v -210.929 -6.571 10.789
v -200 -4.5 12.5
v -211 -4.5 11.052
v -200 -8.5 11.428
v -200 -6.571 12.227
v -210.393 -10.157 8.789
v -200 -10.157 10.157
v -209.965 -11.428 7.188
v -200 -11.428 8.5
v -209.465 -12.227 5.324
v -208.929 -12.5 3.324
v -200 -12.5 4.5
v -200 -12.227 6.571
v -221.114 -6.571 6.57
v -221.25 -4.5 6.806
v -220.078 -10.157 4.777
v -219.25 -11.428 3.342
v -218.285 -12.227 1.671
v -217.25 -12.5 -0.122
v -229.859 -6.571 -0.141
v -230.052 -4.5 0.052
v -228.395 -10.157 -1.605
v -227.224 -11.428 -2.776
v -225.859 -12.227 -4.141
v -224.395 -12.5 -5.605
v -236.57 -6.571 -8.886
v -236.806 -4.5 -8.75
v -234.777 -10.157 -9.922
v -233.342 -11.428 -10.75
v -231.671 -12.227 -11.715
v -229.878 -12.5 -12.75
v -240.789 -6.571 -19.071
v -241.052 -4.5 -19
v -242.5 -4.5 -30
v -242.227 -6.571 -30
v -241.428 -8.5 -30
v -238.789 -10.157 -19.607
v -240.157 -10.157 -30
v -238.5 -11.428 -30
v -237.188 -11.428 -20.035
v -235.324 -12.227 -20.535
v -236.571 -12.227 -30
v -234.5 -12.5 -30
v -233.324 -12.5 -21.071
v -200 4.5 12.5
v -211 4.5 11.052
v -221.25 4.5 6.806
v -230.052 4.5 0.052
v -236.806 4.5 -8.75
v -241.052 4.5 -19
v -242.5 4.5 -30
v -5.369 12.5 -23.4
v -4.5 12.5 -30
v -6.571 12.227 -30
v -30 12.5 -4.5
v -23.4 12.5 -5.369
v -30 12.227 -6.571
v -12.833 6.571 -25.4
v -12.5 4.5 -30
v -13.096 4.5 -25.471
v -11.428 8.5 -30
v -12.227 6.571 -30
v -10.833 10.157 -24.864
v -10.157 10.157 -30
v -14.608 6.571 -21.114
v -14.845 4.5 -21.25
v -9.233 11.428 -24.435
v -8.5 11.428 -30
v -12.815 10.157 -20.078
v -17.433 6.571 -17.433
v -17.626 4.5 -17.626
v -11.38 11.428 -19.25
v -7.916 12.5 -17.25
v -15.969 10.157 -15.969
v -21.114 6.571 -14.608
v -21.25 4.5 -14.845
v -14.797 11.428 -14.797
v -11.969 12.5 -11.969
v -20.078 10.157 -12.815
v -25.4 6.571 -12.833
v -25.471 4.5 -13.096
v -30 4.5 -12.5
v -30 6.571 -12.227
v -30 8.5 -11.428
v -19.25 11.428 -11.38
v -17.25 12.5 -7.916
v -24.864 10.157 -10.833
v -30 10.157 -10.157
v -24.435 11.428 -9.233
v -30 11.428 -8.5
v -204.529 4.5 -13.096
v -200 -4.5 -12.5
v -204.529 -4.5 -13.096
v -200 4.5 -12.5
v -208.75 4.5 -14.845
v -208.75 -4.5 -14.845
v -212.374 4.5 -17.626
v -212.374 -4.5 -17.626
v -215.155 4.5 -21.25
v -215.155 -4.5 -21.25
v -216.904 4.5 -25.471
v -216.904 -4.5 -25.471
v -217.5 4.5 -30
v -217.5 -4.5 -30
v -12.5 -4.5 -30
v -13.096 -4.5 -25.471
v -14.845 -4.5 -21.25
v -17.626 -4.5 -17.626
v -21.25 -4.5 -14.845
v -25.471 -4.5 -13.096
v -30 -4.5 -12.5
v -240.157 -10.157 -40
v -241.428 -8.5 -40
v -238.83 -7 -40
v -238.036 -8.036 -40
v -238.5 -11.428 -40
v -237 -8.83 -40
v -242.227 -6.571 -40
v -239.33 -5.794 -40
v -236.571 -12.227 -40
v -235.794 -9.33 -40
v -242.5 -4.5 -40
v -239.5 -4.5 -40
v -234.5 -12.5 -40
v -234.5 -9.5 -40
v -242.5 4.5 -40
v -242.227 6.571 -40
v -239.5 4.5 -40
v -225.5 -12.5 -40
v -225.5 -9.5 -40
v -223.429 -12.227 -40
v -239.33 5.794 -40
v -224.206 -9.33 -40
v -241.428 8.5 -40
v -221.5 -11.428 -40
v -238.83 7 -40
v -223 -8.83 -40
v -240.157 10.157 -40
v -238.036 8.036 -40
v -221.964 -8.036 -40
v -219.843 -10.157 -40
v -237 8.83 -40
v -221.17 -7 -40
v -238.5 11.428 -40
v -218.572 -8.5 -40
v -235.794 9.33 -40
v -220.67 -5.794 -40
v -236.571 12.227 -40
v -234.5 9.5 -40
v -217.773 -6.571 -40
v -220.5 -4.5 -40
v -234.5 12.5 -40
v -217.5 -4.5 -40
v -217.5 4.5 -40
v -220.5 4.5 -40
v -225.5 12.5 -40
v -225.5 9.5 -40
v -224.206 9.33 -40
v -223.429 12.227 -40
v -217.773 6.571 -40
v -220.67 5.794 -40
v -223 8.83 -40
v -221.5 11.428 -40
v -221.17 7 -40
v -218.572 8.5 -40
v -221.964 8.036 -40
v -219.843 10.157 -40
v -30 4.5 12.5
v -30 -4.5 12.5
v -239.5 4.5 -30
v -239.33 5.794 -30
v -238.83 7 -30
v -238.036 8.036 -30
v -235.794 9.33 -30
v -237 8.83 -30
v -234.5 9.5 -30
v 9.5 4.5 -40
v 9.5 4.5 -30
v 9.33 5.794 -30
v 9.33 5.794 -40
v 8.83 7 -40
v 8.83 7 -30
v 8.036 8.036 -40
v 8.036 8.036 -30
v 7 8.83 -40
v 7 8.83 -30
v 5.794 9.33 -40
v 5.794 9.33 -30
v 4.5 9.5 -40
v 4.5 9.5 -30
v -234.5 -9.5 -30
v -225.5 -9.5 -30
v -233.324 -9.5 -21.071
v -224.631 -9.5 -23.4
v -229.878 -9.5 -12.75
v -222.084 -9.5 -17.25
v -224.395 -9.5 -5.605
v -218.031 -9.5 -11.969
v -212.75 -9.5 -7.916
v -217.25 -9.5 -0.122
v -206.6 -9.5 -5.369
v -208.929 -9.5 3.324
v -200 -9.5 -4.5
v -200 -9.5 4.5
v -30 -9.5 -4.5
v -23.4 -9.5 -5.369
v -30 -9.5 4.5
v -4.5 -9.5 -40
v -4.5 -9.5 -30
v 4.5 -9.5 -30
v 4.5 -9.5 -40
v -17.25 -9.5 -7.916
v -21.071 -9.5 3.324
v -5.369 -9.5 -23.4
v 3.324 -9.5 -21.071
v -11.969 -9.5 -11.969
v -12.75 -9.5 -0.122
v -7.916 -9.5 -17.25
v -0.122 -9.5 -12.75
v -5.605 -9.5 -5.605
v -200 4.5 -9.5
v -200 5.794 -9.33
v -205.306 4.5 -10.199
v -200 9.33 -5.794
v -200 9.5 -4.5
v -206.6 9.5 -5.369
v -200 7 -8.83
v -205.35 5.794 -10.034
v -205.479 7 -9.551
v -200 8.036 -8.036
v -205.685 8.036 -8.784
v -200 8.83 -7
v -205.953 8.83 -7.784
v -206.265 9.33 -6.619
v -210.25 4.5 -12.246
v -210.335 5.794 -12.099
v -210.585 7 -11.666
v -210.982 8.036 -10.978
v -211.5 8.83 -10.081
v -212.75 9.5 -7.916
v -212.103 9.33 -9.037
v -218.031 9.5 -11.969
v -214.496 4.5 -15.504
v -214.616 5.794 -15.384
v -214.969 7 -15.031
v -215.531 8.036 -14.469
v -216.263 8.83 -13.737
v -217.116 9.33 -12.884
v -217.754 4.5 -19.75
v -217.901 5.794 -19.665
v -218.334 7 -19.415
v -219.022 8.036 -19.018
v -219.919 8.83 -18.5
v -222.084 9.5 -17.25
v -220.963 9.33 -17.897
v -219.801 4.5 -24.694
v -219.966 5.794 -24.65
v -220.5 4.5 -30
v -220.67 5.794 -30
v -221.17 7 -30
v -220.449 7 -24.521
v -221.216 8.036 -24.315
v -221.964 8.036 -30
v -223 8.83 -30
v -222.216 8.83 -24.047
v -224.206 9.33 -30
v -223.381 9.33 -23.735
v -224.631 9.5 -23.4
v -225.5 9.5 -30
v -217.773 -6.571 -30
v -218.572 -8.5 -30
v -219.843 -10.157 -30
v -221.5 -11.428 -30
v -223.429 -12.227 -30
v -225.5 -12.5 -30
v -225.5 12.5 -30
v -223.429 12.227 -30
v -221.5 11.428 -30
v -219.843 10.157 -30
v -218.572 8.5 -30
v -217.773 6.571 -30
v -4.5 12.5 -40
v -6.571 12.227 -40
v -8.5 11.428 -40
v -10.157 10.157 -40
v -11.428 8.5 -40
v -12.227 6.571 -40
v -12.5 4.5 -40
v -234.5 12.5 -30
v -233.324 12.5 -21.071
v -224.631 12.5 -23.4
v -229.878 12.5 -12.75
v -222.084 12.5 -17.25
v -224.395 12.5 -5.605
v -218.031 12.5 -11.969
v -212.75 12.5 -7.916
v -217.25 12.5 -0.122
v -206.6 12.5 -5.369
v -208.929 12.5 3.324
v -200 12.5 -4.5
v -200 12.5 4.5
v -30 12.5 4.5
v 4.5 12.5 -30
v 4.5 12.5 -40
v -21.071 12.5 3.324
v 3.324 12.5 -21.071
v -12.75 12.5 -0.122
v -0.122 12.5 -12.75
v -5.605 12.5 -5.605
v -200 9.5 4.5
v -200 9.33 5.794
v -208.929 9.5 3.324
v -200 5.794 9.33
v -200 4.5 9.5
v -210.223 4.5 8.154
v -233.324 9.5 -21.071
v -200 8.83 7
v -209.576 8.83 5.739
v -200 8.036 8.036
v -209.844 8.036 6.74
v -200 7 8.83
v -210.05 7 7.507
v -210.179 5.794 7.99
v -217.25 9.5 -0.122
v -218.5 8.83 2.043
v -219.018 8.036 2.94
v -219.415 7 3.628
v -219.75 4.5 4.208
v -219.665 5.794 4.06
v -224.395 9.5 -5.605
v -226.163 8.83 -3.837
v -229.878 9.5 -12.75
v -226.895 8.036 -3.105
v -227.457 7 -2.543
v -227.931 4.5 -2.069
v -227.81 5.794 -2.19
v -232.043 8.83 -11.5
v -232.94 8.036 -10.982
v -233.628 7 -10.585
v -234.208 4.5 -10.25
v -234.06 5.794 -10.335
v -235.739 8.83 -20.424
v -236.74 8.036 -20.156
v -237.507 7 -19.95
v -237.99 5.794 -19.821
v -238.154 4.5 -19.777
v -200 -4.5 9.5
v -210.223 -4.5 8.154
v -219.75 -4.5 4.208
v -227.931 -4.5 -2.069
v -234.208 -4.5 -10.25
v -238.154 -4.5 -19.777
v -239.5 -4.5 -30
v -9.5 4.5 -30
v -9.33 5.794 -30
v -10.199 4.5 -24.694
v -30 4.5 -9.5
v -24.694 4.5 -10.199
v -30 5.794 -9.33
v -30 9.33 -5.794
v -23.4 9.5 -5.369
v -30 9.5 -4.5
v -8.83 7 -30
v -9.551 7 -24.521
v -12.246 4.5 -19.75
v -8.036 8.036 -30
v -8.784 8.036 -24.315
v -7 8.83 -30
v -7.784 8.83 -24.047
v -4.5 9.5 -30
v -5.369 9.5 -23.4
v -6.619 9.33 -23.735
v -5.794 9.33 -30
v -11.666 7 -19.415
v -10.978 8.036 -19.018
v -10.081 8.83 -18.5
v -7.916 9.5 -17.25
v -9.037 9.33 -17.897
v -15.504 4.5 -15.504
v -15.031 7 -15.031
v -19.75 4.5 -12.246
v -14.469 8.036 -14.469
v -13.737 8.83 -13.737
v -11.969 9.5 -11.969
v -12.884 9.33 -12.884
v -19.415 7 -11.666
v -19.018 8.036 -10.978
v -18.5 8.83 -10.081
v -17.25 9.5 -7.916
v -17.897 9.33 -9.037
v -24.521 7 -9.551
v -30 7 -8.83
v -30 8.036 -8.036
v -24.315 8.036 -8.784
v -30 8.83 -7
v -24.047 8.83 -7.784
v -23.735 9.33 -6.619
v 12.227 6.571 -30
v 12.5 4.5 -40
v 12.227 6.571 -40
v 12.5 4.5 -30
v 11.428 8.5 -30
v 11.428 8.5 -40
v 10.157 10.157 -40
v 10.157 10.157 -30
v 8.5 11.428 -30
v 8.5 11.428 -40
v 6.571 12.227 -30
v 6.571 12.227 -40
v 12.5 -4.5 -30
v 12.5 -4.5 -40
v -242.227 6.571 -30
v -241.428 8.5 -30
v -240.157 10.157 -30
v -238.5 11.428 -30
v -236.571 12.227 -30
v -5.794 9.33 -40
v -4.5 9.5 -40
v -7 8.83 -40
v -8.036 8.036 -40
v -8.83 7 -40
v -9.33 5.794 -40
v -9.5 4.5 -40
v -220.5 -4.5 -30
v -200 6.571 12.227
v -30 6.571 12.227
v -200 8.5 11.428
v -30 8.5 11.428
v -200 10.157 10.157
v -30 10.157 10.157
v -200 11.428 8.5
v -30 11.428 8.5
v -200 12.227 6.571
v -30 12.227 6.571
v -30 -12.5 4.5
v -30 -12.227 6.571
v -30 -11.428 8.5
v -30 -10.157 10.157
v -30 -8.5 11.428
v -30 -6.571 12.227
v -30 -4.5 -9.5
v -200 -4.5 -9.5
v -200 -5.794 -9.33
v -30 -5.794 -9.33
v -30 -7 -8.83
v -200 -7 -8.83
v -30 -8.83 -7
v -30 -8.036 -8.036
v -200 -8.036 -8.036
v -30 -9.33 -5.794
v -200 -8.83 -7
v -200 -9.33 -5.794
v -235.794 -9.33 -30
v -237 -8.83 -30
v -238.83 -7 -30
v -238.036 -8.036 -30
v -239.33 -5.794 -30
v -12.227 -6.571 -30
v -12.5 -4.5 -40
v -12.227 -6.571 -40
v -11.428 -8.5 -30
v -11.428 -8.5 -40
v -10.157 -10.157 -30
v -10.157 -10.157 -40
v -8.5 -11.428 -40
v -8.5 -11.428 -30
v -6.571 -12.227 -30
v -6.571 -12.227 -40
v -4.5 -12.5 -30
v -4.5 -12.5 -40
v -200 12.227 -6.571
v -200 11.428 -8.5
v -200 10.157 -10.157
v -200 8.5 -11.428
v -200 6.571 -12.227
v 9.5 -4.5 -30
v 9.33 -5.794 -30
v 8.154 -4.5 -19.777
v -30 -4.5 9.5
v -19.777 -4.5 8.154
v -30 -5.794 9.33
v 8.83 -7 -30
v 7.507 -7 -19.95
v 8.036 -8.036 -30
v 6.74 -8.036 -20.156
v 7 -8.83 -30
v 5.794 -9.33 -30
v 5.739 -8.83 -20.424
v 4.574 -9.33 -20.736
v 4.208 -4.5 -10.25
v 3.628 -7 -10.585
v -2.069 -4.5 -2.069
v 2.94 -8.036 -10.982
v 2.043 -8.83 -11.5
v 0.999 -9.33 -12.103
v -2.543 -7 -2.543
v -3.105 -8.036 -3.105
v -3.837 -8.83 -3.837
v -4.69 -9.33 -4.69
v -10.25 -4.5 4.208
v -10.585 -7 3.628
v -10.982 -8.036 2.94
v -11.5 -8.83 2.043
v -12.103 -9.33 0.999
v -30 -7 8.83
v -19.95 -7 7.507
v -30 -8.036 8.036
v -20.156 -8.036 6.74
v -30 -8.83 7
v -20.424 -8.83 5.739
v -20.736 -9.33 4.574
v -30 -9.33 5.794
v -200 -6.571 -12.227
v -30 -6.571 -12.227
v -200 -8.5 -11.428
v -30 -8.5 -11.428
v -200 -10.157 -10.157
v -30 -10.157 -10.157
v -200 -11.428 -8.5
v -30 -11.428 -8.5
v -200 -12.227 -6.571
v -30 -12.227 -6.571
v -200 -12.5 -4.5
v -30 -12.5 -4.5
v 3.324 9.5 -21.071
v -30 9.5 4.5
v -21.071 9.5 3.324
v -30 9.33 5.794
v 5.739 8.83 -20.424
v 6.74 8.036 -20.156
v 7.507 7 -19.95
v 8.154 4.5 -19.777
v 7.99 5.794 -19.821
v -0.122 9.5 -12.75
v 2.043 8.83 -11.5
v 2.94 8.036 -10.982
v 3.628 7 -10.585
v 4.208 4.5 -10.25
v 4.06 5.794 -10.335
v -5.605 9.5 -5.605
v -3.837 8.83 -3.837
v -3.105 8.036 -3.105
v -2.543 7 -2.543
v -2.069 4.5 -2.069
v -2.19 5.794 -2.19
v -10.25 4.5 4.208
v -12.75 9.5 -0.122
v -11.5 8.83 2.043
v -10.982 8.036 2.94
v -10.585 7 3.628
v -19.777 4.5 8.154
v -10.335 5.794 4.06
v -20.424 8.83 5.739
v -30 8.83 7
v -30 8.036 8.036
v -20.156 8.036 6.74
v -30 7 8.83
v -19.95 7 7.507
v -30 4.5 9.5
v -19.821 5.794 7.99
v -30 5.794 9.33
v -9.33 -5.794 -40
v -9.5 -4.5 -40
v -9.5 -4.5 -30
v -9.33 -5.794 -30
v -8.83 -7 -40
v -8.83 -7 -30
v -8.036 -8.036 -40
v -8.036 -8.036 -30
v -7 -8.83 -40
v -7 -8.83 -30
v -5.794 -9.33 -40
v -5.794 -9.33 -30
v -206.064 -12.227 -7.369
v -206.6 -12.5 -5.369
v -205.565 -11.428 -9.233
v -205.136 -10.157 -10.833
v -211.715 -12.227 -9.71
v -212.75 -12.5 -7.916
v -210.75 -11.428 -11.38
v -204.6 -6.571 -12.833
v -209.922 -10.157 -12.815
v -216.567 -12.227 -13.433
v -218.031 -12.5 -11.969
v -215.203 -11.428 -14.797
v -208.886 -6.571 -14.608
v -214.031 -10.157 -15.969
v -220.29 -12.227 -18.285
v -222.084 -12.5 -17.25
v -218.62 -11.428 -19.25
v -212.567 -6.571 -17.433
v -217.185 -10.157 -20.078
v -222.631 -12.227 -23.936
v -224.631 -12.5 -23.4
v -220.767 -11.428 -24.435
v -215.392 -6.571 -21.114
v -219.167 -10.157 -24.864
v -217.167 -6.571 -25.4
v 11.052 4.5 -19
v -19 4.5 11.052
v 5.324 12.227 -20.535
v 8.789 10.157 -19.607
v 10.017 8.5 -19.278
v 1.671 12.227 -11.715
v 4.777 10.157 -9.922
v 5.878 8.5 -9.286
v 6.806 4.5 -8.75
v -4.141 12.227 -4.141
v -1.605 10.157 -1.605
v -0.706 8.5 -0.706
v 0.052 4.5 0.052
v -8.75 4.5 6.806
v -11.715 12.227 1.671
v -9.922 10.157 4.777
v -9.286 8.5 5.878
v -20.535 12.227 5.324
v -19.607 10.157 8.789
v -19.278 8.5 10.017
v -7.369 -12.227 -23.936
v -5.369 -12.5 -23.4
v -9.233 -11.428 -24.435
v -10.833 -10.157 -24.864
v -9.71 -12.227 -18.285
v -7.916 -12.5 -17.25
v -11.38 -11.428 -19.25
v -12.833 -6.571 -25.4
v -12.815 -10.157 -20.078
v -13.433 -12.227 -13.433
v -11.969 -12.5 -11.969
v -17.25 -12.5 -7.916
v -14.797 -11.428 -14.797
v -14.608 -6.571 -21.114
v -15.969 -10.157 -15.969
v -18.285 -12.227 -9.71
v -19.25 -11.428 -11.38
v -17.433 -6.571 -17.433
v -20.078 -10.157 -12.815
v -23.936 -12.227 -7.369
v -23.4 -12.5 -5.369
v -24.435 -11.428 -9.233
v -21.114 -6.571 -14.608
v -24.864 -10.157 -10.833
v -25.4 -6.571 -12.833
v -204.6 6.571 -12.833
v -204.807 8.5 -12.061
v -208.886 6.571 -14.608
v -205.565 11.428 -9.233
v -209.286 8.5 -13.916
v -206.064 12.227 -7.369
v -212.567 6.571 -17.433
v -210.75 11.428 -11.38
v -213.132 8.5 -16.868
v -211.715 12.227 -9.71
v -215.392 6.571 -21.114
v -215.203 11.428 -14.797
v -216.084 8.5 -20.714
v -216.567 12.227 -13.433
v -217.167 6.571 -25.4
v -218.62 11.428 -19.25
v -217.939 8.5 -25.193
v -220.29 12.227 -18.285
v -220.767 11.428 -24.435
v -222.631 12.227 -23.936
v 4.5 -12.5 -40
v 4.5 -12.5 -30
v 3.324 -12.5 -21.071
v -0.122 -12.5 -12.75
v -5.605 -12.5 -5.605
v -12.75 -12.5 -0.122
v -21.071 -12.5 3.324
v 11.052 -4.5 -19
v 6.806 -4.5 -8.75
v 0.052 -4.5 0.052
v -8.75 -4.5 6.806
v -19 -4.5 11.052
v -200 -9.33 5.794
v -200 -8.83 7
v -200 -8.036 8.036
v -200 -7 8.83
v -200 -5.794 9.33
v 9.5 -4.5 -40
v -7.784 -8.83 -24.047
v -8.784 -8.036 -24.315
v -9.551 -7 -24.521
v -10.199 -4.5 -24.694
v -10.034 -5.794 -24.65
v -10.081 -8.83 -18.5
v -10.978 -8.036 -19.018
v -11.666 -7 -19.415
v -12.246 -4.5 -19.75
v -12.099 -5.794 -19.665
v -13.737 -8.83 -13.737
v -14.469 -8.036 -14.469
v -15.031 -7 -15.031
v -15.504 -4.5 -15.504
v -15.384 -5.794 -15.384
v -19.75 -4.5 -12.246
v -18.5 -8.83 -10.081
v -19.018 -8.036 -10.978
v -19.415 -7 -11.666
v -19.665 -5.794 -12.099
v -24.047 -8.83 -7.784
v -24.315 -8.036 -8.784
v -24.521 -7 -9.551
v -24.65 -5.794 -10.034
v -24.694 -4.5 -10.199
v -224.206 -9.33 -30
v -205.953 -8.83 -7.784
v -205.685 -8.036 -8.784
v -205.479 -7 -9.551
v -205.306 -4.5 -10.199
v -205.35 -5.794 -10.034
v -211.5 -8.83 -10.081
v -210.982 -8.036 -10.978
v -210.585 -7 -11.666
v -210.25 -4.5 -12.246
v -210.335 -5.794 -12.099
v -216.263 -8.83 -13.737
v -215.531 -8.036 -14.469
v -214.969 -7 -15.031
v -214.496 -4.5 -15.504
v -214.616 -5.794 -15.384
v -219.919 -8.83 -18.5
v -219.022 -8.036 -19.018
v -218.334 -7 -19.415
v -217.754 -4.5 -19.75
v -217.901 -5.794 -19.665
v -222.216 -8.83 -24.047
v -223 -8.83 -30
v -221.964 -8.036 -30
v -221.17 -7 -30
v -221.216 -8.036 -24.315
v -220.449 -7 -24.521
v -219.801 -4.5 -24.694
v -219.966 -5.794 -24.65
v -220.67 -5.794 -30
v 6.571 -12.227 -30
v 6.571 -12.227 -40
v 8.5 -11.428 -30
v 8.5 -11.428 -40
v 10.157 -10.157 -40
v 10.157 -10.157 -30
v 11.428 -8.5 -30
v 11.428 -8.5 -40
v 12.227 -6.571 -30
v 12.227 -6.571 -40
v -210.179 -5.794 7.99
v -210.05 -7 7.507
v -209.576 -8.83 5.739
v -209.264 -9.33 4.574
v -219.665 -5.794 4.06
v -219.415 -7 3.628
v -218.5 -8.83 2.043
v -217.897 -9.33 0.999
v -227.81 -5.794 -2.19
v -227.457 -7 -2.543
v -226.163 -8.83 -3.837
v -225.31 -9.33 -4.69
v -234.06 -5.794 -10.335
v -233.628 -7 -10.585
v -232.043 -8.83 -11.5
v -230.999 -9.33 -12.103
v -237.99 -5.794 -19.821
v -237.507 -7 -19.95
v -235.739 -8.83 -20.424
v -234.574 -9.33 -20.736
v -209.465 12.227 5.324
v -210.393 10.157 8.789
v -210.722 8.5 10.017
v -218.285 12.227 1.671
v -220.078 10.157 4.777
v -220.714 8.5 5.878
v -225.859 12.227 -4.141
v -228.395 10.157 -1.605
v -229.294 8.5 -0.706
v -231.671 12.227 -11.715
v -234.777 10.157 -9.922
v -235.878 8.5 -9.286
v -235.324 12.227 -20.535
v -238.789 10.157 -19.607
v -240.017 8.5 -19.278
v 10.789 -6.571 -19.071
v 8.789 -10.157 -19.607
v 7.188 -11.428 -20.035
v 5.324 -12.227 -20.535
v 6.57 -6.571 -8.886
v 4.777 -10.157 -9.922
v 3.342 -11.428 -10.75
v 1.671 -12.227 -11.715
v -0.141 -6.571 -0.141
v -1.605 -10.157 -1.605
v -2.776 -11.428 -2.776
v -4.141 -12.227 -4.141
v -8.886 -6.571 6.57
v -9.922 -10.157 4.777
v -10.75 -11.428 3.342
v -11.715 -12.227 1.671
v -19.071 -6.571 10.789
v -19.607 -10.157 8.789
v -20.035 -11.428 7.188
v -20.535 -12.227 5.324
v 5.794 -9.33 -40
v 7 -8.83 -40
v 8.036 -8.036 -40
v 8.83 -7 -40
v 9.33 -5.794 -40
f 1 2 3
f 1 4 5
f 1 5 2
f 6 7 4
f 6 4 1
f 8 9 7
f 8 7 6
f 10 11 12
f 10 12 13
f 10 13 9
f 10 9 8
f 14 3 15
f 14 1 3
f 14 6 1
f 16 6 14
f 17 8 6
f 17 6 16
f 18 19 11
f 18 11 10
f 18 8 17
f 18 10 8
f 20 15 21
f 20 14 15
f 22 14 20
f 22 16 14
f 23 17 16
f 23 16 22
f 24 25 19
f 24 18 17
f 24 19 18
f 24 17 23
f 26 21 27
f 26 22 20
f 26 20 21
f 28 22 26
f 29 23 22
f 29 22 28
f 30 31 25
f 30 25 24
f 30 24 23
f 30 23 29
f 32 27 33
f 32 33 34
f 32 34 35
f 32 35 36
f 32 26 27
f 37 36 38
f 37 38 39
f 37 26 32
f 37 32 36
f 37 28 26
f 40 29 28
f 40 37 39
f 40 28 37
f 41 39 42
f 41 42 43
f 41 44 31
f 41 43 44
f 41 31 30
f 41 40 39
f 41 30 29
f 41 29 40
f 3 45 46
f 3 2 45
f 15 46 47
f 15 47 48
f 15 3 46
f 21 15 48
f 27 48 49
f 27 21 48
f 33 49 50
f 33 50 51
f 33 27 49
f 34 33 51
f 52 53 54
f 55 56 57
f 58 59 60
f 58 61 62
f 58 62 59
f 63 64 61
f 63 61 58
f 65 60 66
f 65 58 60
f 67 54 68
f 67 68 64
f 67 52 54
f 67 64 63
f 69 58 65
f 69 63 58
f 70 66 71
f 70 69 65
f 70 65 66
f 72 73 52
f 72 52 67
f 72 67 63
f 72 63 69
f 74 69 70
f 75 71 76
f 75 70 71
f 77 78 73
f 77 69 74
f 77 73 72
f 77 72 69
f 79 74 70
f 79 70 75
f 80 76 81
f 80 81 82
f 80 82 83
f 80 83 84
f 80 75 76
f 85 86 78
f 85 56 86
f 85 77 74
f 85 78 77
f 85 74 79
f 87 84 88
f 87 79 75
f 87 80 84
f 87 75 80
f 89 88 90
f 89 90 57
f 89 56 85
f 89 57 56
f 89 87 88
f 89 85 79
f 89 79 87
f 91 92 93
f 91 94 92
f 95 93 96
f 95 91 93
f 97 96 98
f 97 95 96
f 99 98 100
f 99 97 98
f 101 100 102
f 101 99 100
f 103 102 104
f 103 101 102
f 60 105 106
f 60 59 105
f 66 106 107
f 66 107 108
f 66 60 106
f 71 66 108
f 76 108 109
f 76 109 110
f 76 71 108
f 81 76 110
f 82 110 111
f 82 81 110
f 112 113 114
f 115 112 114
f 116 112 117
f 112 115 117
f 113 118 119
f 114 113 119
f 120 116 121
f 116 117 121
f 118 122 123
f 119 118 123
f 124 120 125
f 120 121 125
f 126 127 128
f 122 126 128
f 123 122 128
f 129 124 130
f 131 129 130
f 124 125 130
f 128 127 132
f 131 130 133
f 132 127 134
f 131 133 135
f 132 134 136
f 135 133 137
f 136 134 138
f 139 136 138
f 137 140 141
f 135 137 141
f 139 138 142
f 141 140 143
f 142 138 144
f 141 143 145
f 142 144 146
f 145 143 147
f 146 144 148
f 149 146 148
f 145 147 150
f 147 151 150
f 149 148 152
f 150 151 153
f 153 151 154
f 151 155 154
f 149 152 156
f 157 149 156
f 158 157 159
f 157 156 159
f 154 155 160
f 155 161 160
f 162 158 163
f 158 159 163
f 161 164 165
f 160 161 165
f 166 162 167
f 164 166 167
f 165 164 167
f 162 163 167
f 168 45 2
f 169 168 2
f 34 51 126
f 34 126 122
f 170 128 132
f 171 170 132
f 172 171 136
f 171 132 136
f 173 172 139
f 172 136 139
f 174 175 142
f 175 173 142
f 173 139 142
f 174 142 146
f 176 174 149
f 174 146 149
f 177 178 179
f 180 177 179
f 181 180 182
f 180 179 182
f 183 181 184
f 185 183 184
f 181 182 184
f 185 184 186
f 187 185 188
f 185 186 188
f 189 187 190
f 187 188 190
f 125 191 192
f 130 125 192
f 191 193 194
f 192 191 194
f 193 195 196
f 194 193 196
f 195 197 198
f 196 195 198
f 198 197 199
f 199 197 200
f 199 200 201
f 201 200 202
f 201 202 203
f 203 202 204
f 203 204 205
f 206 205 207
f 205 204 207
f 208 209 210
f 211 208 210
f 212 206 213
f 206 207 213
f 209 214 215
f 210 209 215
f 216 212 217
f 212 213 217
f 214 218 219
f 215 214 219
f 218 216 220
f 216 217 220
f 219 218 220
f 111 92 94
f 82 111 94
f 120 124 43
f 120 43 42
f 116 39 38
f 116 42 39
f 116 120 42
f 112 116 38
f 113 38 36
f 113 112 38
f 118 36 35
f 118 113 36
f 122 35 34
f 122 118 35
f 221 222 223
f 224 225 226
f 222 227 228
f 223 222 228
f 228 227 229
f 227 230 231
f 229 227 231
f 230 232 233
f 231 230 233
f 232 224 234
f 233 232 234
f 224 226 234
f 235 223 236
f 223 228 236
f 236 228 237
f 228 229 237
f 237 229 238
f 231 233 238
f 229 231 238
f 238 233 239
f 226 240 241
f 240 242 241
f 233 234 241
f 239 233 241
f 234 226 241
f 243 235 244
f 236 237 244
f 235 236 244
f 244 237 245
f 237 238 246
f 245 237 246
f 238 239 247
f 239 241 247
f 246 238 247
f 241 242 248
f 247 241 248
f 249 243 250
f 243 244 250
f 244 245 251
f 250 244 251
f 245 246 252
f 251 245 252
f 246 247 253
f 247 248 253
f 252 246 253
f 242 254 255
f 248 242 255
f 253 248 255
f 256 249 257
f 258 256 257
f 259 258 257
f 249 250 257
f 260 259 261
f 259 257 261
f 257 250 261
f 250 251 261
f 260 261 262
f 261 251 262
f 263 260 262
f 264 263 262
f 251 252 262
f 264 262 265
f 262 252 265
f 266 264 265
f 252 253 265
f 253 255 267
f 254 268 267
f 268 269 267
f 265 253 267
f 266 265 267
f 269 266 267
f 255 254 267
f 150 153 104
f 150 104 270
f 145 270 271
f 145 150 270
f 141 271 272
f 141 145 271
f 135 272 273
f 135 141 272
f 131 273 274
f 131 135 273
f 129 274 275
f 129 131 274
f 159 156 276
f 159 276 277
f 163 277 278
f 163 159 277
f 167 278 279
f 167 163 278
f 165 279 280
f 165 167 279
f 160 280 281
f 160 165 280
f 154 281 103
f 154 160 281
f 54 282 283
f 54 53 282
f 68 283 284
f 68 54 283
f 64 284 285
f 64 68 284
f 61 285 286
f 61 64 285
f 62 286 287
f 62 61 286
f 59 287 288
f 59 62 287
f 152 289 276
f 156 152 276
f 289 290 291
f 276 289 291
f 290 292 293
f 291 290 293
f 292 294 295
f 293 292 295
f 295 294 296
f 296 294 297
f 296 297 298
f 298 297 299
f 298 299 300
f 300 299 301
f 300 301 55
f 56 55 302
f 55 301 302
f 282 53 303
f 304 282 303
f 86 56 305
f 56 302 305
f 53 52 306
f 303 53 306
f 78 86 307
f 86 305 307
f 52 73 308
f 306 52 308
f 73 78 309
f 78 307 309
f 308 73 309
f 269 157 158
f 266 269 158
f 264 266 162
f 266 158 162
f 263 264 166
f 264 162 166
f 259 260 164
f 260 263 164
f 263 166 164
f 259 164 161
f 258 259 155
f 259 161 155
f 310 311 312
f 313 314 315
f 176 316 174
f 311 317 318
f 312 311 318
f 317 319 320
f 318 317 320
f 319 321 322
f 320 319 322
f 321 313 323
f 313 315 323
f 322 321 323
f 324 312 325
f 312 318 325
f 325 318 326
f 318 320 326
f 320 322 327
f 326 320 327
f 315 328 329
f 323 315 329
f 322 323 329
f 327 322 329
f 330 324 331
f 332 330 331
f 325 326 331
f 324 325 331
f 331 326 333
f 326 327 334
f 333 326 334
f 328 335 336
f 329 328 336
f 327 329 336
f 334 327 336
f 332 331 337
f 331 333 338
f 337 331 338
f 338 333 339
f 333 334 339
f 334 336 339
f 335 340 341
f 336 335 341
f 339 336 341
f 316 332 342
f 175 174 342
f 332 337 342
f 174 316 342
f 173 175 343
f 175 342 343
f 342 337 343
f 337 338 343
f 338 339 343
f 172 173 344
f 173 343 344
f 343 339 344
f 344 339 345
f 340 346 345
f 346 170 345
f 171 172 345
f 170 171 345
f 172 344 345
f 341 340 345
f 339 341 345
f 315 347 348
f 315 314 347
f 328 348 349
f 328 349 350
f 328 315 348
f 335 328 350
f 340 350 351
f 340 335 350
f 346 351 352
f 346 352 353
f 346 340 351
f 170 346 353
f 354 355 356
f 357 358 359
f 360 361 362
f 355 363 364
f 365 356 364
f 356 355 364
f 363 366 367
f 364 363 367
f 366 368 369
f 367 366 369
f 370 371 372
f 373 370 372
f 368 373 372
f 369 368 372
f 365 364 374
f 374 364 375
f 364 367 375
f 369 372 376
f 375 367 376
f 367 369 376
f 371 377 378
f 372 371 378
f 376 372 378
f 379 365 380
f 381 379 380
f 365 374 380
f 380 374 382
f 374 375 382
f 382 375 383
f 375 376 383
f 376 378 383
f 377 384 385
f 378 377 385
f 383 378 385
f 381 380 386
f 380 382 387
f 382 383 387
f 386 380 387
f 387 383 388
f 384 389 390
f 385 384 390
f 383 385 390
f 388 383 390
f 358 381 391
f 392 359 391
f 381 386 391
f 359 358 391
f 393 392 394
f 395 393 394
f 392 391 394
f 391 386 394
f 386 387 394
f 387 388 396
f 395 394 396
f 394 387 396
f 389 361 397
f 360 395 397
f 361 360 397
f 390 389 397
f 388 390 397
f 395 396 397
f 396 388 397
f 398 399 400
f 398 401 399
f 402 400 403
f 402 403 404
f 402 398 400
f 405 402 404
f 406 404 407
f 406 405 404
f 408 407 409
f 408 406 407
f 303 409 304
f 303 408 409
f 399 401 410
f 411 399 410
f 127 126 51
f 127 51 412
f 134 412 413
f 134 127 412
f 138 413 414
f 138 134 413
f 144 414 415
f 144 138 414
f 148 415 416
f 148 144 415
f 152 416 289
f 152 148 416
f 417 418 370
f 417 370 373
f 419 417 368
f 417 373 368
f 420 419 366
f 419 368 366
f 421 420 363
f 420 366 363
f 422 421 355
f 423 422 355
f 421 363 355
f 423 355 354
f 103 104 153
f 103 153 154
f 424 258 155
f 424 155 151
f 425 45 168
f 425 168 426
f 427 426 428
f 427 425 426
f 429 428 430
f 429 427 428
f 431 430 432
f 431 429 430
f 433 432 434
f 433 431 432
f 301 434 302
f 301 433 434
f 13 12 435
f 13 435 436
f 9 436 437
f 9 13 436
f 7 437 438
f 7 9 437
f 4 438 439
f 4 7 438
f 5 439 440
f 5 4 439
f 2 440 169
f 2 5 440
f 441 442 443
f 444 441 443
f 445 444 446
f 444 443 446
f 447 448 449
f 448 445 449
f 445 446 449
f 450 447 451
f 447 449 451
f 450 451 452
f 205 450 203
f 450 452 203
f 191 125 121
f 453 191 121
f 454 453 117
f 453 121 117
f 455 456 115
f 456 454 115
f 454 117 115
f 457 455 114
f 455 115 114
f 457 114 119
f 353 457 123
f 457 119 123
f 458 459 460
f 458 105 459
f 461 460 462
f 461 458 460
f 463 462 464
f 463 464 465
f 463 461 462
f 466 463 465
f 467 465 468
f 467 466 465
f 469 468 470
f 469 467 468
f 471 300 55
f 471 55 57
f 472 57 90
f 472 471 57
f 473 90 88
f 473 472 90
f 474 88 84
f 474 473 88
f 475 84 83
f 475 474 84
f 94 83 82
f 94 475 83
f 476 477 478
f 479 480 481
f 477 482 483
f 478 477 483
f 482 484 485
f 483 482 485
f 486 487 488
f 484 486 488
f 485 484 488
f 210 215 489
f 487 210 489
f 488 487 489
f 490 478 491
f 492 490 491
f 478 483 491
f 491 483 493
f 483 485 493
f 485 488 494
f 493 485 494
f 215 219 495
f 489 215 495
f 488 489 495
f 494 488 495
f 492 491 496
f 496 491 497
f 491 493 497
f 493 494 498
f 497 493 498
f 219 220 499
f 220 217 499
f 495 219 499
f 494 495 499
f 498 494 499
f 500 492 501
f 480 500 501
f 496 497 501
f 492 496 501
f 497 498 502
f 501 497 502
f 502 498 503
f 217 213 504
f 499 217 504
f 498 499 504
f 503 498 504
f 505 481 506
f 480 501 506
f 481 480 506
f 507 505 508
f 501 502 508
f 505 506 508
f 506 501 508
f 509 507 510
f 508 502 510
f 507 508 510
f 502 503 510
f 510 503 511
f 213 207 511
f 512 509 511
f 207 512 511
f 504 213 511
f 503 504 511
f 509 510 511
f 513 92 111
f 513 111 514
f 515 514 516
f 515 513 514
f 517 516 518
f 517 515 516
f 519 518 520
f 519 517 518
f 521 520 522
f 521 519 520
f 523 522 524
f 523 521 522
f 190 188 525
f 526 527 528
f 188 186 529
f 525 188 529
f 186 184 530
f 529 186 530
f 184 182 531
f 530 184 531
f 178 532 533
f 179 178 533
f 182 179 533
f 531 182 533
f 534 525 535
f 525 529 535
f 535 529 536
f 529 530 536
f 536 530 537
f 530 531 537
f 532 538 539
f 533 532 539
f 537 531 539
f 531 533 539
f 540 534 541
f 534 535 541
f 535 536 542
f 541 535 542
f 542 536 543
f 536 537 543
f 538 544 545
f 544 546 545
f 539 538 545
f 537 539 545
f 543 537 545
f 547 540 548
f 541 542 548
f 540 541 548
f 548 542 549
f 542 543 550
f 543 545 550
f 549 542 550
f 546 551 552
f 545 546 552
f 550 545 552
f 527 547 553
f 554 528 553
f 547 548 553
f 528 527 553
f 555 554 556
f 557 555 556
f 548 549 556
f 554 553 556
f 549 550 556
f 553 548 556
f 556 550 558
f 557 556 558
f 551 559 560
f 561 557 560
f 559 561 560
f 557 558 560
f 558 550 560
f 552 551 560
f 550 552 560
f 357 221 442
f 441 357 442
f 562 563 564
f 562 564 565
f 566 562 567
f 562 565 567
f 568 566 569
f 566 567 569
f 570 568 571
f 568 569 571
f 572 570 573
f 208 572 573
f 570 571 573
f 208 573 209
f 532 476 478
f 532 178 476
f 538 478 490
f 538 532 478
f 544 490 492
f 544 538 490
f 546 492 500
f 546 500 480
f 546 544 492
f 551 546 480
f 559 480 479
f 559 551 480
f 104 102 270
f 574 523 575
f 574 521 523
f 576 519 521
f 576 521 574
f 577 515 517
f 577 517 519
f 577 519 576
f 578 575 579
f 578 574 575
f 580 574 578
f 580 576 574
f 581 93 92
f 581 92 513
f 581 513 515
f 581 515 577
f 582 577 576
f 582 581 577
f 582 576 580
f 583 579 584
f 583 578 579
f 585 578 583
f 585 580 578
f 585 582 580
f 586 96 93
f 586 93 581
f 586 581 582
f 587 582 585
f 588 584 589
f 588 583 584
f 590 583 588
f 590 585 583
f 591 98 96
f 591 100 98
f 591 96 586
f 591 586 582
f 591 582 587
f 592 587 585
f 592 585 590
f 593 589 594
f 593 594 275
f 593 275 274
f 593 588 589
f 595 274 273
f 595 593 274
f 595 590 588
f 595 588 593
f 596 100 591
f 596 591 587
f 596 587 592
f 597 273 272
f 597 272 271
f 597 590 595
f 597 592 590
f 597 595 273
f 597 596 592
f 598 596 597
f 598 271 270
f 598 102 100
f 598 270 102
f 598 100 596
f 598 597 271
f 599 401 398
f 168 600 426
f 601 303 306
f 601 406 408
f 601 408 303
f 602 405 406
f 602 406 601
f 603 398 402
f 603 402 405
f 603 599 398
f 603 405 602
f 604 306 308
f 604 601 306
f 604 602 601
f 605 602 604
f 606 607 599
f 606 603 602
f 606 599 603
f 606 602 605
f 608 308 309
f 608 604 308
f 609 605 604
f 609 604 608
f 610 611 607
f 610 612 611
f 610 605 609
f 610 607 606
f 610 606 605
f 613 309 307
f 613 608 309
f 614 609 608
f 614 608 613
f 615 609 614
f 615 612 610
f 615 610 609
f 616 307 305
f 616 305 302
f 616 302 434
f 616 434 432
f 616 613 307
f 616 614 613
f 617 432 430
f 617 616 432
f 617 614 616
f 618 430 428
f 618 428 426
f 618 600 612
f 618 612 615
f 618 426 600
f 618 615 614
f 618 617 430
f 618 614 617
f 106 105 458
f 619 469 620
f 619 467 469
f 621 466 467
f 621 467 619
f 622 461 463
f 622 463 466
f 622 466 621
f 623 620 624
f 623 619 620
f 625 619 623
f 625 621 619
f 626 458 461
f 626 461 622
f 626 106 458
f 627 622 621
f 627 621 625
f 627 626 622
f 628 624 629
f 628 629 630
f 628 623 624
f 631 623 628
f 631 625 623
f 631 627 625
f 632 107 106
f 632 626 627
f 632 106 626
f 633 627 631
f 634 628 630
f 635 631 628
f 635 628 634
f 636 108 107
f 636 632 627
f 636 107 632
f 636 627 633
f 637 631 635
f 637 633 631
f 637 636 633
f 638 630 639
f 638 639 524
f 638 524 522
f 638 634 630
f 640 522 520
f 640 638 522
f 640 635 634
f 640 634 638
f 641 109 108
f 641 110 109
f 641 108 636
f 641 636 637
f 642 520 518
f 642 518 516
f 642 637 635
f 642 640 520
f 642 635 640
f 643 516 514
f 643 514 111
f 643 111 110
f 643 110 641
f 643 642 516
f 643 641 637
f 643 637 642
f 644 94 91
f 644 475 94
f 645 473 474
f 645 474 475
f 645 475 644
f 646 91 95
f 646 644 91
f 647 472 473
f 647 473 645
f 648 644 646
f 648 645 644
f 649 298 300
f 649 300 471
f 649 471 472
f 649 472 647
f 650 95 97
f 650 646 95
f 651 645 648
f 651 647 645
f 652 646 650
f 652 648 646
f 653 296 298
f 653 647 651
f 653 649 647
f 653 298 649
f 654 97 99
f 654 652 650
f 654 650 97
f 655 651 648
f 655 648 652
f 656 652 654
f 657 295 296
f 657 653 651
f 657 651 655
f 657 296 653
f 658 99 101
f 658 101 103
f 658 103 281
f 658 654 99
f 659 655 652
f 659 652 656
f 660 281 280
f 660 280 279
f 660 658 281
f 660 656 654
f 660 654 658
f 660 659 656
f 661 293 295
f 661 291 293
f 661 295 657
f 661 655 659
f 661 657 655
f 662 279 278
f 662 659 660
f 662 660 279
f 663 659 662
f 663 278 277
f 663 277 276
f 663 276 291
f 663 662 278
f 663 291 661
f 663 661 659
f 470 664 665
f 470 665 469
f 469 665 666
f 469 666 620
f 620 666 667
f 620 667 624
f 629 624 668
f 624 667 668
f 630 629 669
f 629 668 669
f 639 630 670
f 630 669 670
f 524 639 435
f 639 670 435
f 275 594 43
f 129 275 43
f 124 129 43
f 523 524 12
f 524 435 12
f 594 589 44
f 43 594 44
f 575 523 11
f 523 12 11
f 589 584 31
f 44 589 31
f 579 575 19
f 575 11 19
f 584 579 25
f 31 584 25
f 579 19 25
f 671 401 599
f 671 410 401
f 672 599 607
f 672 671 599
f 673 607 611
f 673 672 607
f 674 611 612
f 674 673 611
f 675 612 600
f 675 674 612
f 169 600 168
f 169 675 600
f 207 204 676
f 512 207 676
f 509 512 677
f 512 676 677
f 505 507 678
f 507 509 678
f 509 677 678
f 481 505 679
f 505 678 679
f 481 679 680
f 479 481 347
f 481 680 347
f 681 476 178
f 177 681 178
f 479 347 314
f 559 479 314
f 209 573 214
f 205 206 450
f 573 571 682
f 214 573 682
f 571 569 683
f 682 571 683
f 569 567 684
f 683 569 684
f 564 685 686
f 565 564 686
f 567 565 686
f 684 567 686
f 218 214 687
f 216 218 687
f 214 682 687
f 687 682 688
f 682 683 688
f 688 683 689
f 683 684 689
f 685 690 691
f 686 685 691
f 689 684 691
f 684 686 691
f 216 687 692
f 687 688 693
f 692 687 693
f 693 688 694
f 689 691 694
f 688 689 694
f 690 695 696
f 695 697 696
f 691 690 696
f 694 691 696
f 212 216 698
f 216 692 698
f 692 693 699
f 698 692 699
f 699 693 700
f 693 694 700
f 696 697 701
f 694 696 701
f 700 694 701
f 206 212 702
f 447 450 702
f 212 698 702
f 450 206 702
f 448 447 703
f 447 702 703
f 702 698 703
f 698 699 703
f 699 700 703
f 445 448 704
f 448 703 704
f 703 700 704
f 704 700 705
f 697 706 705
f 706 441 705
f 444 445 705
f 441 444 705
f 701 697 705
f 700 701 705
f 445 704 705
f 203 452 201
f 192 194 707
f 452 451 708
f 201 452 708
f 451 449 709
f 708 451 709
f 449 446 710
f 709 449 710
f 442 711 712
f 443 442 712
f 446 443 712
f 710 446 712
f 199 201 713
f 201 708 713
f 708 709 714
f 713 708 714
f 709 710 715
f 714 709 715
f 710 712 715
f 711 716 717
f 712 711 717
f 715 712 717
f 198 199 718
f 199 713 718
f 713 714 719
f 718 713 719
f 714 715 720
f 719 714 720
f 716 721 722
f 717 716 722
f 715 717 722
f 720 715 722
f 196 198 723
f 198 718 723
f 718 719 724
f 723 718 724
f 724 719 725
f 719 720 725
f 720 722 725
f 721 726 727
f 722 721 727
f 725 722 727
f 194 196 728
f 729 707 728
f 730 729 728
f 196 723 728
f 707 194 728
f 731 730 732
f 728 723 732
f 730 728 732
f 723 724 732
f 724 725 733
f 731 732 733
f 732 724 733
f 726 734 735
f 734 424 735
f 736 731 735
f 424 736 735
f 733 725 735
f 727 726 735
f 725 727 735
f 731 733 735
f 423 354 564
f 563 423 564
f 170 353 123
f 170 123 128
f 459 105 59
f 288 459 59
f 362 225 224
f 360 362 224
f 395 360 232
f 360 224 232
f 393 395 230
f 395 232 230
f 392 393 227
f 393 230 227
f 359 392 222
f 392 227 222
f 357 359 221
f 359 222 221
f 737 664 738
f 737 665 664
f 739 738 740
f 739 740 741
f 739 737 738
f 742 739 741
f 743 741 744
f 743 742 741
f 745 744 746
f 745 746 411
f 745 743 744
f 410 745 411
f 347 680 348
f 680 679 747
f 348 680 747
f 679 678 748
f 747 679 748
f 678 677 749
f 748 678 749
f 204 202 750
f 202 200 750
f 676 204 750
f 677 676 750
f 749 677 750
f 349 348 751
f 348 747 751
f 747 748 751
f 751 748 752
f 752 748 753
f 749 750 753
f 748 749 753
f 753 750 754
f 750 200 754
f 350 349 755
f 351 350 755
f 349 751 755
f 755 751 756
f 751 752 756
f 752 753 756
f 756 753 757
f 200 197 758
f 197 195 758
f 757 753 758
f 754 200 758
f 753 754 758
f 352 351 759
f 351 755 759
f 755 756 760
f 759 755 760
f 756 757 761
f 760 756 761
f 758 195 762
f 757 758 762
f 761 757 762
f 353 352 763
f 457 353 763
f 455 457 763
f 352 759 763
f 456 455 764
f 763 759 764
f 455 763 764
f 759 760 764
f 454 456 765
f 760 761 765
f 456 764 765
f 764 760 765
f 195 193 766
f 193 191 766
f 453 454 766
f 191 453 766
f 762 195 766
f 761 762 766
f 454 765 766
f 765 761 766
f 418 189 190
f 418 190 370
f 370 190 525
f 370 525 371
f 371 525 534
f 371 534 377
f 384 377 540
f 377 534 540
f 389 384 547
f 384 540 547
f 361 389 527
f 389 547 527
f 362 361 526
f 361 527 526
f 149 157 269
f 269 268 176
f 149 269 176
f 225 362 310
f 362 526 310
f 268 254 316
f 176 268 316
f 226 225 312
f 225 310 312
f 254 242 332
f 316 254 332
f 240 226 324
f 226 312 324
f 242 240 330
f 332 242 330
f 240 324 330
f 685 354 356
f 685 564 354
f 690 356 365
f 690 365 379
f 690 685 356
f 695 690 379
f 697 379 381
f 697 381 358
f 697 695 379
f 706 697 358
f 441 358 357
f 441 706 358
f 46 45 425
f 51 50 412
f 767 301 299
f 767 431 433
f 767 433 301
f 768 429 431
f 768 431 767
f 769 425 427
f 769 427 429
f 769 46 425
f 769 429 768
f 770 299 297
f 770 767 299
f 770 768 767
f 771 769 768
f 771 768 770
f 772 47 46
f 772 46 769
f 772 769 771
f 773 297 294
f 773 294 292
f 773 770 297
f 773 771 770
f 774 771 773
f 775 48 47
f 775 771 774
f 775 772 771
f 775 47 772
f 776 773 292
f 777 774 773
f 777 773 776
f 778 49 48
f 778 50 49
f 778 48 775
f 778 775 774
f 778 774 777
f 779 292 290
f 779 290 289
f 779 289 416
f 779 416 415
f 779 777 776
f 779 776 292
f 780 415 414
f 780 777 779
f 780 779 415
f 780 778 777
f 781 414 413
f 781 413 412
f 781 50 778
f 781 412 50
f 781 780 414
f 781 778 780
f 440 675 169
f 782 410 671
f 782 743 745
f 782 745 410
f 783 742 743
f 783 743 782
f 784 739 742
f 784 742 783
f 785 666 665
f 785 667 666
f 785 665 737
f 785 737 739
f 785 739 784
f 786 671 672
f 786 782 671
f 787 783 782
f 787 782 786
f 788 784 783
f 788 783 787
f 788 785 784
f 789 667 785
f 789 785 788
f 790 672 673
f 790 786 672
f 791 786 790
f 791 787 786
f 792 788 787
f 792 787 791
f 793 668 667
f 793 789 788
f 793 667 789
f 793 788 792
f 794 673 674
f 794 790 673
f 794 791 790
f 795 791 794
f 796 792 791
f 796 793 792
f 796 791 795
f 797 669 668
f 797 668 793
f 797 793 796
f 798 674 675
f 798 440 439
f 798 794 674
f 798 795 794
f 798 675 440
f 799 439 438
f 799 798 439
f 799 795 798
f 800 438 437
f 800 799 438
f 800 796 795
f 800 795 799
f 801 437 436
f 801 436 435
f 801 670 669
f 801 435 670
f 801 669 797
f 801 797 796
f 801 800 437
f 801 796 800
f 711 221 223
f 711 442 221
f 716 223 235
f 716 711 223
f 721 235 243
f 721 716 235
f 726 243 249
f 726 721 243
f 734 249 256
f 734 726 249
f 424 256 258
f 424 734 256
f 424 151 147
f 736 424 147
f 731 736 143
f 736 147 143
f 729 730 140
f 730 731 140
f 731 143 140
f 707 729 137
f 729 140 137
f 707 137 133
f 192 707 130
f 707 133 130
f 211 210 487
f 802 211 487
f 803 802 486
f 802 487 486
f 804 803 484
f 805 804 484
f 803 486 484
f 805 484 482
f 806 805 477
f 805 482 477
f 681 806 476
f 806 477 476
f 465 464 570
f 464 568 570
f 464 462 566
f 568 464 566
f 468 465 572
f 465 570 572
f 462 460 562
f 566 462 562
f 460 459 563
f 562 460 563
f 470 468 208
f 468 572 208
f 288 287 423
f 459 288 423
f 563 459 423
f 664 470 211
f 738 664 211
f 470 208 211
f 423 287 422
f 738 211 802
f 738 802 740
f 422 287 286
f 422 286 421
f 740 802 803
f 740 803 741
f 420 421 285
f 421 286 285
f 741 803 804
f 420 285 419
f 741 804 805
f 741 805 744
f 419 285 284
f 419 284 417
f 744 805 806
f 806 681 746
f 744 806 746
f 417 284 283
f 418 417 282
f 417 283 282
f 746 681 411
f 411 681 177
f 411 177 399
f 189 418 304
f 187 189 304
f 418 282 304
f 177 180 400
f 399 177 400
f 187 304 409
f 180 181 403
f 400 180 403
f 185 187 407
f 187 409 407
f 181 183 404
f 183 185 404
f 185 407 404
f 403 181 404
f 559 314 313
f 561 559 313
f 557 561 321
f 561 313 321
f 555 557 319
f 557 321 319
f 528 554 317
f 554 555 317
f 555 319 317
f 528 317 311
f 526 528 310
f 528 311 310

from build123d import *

# Parameters (mm, degrees)
SKETCH11_W         = 485.793761844
SKETCH11_H         = 595.960227968
CUT_EXTRUDE1_DEPTH = 130.789538956


with BuildPart() as part:
    # Sweep-Thin1: sweep along a path in Sketch2
    with BuildLine(Plane(origin=(0, 0, 0), x_dir=(1, 0, 0), z_dir=(0, 1, 0))) as sweep_thin1_path:
        Line((0, 169.789538956), (0, 157.289538956))
        Line((0, 157.289538956), (0, 30))
        ThreePointArc((0, 30), (-8.786796564, 8.786796564), (-30, 0))
        Line((-30, 0), (-200, 0))
        ThreePointArc((-200, 0), (-221.213203436, 8.786796564), (-230, 30))
        Line((-230, 30), (-230, 40))
    # Sketch6 → Sweep-Thin1 (sweep)
    with BuildSketch(Plane.XY.offset(-40)):
        with BuildLine():
            Line((-225.5, 12.5), (-234.5, 12.5))
            ThreePointArc((-234.5, 12.5), (-240.156854249, 10.156854249), (-242.5, 4.5))
            Line((-242.5, 4.5), (-242.5, -4.5))
            ThreePointArc((-242.5, -4.5), (-240.156854249, -10.156854249), (-234.5, -12.5))
            Line((-234.5, -12.5), (-225.5, -12.5))
            ThreePointArc((-225.5, -12.5), (-219.843145751, -10.156854249), (-217.5, -4.5))
            Line((-217.5, -4.5), (-217.5, 4.5))
            ThreePointArc((-217.5, 4.5), (-219.843145751, 10.156854249), (-225.5, 12.5))
        make_face()
        with BuildLine():
            Line((-225.5, 9.5), (-234.5, 9.5))
            ThreePointArc((-234.5, 9.5), (-238.035533906, 8.035533906), (-239.5, 4.5))
            Line((-239.5, 4.5), (-239.5, -4.5))
            ThreePointArc((-239.5, -4.5), (-238.035533906, -8.035533906), (-234.5, -9.5))
            Line((-234.5, -9.5), (-225.5, -9.5))
            ThreePointArc((-225.5, -9.5), (-221.964466094, -8.035533906), (-220.5, -4.5))
            Line((-220.5, -4.5), (-220.5, 4.5))
            ThreePointArc((-220.5, 4.5), (-221.964466094, 8.035533906), (-225.5, 9.5))
        make_face(mode=Mode.SUBTRACT)
    sweep(path=sweep_thin1_path.line)

    # Sketch11 → Cut-Extrude1 (cut, through all)
    with BuildSketch(Plane.XY.offset(-40)):
        with Locations((212.093031721, 3.359547151)):
            Rectangle(SKETCH11_W, SKETCH11_H)
    extrude(amount=-CUT_EXTRUDE1_DEPTH, mode=Mode.SUBTRACT)


solid = part.part
